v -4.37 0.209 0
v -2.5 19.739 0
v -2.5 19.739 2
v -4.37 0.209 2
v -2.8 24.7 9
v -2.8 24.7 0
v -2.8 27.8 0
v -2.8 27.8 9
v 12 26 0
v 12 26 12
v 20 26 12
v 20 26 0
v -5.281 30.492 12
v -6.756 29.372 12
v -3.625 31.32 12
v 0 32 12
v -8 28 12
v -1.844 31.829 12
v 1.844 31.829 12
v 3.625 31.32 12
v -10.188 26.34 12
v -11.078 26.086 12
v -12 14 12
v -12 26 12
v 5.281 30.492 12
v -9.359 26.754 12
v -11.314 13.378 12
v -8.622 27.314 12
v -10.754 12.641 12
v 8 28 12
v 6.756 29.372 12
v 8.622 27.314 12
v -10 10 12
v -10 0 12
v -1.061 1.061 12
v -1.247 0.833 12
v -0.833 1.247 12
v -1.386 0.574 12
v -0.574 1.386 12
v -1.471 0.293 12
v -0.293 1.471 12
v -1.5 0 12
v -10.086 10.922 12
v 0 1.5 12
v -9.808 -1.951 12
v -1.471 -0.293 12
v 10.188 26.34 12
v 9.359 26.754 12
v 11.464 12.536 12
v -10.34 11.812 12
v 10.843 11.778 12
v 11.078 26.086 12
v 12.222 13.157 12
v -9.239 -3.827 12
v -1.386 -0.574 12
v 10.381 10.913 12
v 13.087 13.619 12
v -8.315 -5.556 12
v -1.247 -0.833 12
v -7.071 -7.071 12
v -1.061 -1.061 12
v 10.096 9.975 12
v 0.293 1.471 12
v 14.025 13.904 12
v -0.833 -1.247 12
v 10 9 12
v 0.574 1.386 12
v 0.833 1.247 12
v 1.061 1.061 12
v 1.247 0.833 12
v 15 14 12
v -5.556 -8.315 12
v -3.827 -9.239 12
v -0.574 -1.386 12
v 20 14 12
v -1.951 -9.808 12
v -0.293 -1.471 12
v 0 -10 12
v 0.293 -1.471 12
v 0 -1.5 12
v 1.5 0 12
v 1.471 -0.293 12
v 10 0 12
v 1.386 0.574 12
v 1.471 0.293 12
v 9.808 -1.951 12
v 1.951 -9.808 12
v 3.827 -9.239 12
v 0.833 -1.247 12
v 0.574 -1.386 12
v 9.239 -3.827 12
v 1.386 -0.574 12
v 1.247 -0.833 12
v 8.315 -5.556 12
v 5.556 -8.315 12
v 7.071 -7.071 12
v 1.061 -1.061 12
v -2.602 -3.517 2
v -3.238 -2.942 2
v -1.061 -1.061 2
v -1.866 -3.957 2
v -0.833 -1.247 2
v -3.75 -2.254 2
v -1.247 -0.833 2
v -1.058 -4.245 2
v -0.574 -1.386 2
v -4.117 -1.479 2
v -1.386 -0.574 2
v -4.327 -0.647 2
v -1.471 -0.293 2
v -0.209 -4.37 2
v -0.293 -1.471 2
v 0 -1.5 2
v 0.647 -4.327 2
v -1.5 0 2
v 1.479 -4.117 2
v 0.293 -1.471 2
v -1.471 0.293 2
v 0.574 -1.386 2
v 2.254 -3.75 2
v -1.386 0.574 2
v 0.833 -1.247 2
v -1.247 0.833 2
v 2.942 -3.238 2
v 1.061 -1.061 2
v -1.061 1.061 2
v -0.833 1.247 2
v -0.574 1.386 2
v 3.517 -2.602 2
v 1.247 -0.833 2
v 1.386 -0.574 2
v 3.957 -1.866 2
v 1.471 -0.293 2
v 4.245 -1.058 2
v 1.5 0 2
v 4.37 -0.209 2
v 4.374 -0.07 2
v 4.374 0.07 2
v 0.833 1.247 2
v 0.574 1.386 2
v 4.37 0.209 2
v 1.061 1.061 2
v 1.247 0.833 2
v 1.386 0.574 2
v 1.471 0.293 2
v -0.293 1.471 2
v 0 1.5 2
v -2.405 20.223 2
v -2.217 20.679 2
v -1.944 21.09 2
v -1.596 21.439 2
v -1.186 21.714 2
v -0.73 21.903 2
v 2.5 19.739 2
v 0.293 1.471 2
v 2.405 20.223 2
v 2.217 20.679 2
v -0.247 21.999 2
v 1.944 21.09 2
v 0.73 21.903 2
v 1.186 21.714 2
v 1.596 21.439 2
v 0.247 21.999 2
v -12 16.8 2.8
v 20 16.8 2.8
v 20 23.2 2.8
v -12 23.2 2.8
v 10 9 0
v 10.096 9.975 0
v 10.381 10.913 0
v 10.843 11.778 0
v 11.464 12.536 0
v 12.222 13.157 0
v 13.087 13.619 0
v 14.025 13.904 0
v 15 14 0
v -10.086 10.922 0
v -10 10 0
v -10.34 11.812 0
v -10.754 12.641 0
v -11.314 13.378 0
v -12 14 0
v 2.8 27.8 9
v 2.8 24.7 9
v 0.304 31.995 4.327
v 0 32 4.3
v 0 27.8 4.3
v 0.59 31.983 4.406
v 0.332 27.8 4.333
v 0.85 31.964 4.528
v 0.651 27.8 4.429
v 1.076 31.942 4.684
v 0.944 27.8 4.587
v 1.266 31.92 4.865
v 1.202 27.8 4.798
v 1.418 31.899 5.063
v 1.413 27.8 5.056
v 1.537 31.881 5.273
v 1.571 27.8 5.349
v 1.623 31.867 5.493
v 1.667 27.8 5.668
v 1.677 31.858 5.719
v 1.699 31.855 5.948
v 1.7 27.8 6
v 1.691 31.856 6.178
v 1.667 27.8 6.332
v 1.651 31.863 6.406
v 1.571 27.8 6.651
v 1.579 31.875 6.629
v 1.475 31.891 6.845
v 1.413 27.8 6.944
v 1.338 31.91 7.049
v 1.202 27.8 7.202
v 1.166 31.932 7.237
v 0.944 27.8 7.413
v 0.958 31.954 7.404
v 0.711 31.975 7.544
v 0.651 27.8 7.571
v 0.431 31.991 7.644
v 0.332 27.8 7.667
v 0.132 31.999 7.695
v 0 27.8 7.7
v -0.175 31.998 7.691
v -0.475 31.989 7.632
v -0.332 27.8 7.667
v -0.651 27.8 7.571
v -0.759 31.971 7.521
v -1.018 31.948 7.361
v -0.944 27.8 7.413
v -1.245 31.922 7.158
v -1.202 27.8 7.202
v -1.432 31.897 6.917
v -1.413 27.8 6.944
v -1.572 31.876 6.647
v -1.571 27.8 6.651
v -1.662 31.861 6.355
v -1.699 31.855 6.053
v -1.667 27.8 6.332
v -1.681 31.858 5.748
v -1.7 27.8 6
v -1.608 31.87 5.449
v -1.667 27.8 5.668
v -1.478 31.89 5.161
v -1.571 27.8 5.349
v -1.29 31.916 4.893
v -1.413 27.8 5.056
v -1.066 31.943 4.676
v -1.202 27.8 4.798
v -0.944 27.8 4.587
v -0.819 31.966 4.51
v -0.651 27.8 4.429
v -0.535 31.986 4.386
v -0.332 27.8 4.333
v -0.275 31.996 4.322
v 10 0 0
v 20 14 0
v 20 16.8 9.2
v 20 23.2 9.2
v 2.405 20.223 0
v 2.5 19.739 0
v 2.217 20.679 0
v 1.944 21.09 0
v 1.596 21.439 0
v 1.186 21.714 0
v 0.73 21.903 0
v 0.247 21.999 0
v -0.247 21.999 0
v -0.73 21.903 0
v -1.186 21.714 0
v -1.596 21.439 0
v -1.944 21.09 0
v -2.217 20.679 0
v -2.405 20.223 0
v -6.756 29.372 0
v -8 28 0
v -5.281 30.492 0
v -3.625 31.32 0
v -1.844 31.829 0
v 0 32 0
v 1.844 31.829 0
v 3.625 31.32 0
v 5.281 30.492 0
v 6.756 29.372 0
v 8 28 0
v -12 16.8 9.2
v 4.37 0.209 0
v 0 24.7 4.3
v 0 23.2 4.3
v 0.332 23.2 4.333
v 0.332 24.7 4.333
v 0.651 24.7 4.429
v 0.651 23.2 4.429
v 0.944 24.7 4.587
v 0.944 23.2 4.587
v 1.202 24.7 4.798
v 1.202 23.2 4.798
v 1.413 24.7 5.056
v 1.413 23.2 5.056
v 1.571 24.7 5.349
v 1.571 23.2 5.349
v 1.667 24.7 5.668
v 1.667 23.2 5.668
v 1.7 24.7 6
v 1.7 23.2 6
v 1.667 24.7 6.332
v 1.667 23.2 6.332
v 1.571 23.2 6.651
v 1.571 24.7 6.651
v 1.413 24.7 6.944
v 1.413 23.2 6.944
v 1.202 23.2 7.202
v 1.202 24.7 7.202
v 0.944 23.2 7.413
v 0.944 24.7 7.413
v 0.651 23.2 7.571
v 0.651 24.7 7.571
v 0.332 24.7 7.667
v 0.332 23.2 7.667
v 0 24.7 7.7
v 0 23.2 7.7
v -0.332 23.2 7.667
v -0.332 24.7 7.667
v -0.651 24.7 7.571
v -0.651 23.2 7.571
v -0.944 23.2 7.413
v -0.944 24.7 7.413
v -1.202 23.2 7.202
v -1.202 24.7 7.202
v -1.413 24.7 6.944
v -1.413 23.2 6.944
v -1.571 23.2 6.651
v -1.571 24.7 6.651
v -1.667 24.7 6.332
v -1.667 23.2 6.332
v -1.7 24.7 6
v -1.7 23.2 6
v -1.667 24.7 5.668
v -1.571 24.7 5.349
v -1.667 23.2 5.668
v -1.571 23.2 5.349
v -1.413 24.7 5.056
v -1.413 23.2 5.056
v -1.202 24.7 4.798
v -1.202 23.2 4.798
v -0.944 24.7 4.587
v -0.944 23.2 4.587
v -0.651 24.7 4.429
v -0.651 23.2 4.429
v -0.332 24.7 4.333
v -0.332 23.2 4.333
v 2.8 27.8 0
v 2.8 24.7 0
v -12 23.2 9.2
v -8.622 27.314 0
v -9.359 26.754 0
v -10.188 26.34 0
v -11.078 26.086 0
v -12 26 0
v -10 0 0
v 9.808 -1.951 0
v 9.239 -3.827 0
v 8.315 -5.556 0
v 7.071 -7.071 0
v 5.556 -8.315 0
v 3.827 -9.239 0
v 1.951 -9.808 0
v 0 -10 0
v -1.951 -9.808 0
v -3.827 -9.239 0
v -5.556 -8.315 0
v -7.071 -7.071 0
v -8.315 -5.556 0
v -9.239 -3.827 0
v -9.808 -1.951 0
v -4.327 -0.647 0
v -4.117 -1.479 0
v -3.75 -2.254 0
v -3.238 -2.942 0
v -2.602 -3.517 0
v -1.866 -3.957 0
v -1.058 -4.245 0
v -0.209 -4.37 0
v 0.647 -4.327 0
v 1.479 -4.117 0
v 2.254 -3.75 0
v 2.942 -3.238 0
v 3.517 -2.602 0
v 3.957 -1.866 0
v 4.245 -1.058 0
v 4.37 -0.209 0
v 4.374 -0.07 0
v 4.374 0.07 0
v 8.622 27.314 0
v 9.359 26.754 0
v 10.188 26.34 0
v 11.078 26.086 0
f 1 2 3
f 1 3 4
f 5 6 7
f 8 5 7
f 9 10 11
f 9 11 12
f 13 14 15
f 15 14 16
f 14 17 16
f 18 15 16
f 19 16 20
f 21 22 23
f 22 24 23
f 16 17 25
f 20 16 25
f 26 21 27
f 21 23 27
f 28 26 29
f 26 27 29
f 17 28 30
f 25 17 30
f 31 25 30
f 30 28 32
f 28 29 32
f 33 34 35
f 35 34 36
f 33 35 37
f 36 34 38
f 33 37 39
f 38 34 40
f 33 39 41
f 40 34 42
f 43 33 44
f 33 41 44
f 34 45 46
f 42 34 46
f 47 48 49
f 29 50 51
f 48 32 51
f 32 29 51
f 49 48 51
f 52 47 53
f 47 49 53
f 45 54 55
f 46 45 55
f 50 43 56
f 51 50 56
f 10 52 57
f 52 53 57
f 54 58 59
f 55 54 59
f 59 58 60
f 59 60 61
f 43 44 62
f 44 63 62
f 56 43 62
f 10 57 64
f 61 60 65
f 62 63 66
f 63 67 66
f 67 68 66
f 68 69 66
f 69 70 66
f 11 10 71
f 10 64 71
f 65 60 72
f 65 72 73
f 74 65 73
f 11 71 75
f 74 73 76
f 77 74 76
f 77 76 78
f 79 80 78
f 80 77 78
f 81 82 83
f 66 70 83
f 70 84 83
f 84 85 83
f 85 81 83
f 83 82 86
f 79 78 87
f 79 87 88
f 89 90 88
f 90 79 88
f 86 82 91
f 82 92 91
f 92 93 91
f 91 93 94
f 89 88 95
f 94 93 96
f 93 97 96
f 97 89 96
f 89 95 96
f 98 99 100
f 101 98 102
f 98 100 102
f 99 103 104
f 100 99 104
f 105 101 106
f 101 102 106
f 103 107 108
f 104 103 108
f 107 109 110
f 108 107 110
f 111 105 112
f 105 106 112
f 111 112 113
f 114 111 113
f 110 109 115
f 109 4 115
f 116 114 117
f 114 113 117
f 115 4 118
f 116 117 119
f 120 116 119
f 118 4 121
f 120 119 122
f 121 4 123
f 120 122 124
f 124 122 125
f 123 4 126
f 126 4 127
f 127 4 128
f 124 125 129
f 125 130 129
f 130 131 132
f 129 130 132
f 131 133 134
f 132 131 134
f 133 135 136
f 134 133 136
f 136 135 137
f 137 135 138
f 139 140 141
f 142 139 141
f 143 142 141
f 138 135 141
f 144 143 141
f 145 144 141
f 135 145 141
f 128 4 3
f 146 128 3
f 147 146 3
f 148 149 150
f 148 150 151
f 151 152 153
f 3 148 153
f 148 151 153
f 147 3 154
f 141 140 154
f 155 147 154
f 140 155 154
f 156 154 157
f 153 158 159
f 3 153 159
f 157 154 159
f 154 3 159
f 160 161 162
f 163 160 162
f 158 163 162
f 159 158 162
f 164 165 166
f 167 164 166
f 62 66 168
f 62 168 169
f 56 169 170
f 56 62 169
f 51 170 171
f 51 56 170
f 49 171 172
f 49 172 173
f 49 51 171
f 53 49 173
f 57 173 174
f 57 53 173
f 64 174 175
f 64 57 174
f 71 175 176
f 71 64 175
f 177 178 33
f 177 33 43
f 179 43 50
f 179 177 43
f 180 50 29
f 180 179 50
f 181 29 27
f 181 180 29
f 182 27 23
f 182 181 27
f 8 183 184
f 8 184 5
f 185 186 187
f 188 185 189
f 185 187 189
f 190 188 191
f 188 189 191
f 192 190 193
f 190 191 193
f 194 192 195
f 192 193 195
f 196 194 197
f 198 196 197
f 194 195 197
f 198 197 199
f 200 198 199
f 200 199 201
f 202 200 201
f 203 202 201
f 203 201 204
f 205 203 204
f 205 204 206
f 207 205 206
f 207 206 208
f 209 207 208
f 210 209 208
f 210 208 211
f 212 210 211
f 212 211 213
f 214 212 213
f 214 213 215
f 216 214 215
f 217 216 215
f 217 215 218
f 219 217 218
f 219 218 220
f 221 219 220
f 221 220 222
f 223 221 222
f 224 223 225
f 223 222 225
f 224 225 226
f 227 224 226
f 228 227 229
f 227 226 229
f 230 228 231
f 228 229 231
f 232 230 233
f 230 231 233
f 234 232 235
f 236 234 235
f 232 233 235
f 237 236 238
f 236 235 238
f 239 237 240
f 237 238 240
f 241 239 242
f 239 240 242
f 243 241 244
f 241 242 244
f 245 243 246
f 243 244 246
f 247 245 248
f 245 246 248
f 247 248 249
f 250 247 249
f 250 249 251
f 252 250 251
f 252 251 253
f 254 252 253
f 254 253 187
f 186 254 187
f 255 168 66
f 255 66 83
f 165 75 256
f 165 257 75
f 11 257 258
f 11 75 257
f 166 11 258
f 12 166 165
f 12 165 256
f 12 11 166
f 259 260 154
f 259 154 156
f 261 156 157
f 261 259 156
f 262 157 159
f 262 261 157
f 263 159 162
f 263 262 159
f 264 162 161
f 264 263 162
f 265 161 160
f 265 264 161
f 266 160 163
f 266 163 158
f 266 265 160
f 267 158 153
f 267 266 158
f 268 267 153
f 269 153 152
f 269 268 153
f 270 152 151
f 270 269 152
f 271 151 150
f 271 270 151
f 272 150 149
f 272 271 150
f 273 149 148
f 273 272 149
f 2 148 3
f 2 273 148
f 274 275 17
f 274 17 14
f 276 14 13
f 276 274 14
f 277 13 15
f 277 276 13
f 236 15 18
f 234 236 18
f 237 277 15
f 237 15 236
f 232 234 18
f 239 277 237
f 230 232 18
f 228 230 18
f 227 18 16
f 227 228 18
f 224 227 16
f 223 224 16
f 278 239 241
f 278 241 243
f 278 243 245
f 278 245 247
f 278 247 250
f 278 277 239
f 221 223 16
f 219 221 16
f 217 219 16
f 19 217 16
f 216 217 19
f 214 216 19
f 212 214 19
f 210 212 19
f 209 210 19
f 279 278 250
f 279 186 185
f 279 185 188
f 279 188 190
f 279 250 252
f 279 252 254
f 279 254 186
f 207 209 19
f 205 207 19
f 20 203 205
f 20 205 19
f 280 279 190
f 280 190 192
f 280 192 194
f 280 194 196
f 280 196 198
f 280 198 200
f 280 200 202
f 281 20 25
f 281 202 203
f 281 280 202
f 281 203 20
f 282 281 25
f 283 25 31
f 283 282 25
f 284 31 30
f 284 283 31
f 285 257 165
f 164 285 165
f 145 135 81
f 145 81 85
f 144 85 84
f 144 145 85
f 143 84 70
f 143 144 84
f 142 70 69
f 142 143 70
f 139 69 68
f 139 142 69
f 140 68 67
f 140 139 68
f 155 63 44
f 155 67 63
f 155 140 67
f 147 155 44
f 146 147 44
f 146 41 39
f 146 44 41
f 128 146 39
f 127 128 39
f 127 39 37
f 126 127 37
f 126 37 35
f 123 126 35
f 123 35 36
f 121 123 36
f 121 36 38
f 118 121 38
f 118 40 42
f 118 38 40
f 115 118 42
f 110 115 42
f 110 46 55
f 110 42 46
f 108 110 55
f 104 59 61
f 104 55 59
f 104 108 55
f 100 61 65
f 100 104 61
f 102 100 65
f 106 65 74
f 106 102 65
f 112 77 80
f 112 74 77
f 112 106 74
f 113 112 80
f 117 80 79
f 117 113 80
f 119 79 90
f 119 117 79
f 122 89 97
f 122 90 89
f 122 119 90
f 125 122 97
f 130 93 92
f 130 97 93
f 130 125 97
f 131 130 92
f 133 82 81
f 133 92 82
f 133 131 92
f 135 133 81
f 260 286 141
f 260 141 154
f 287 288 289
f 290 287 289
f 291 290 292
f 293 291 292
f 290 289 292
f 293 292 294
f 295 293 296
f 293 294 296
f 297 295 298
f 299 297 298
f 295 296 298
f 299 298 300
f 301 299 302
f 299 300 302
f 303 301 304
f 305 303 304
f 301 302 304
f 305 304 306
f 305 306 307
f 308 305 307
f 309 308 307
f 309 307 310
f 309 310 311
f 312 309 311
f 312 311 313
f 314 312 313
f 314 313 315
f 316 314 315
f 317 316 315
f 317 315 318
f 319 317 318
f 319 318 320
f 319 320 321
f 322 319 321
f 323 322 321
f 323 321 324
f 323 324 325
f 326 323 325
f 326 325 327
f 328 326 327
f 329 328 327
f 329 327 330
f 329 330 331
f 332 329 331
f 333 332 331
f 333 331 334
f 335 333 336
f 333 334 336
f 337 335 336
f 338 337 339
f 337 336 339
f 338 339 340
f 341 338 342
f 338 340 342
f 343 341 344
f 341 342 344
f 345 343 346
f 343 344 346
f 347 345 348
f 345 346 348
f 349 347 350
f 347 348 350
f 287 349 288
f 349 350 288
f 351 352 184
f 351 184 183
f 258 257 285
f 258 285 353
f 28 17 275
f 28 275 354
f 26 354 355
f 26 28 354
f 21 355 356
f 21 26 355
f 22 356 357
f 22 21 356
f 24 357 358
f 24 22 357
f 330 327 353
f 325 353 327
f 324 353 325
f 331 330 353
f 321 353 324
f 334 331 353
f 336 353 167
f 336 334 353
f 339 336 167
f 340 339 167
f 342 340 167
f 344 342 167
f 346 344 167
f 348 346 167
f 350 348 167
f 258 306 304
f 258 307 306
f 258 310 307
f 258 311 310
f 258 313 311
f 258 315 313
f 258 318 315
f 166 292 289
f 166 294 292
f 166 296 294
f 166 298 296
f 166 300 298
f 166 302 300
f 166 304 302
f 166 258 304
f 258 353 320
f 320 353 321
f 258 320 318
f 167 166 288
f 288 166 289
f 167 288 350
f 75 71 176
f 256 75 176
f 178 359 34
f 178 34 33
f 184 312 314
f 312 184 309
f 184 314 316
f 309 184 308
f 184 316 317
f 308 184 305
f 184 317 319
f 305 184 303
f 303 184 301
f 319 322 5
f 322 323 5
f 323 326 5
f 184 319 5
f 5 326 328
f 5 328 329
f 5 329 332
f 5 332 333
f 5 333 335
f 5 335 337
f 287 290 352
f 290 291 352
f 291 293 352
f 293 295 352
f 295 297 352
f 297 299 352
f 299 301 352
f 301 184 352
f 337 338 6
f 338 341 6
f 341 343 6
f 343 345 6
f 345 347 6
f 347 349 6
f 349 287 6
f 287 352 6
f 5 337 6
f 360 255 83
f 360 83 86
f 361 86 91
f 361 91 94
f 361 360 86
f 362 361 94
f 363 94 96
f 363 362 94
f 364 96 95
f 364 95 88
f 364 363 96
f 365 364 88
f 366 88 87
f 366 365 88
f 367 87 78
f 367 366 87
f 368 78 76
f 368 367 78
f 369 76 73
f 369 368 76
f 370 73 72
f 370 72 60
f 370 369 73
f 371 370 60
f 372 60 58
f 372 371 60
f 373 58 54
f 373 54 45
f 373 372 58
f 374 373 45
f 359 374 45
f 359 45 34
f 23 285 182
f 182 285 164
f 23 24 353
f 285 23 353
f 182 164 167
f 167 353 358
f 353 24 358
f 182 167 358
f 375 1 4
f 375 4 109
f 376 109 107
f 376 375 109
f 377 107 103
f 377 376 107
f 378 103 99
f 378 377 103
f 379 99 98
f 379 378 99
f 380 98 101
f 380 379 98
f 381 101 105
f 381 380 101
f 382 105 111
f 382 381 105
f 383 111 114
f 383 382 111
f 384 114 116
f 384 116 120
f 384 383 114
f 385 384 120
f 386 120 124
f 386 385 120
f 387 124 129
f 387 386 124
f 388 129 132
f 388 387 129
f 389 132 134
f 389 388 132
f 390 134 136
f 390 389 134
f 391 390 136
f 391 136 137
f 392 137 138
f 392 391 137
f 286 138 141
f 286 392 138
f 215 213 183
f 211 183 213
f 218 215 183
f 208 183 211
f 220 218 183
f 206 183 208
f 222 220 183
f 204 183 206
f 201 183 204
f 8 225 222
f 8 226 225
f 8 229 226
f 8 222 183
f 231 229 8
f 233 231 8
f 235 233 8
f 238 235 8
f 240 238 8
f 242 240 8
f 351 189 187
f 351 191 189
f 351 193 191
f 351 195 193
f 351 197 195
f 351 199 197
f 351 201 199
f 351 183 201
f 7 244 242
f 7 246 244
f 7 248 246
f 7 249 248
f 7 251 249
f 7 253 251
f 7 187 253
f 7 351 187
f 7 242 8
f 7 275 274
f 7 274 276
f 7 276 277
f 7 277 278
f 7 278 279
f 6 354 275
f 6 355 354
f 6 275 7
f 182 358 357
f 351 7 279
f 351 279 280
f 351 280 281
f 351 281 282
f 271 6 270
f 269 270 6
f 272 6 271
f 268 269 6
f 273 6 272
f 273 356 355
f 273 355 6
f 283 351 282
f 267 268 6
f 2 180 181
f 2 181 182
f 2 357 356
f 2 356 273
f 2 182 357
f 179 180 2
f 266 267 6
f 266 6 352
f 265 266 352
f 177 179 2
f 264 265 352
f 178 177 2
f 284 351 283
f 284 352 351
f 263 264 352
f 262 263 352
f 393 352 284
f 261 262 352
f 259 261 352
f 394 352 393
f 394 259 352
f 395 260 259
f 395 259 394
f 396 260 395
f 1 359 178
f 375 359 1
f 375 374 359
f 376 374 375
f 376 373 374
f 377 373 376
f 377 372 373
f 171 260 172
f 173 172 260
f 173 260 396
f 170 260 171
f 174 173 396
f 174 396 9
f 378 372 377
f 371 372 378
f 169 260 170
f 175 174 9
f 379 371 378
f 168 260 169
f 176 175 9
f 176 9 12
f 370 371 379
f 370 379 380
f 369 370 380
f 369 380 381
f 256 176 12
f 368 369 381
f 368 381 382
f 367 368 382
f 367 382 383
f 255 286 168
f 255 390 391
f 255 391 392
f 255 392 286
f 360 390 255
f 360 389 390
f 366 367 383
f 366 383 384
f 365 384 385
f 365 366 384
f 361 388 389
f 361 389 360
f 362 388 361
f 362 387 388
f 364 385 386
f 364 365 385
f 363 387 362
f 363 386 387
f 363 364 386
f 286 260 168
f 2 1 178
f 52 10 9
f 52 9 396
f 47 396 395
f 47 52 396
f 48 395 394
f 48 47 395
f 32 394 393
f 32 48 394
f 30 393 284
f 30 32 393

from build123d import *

# Parameters (mm, degrees)
BOSS_EXTRUDE1_DEPTH      = 12
SKETCH4_R                = 1.5
CUT_EXTRUDE2_DEPTH       = 36.60898763
BOSS_EXTRUDE2_DEPTH      = 20
BOSS_EXTRUDE2_DEPTH_BACK = 12
SKETCH7_W                = 12
SKETCH7_H                = 12
CUT_EXTRUDE1_DEPTH       = 2
SKETCH8_W                = 6.4
SKETCH8_H                = 6.4
CUT_EXTRUDE4_DEPTH       = 47.818799643
SKETCH9_W                = 5.6
SKETCH9_H                = 3.1
CUT_EXTRUDE5_DEPTH       = 9
SKETCH10_R               = 1.7
CUT_EXTRUDE6_DEPTH       = 41.573883226
FILLET1_R                = 5


with BuildPart() as part:
    # Sketch1 → Boss-Extrude1 (new body)
    with BuildSketch(Plane.XY):
        with BuildLine():
            Line((10, 22), (10, 0))
            ThreePointArc((10, 0), (0, -10), (-10, 0))
            Line((-10, 0), (-10, 22))
            ThreePointArc((-10, 22), (0, 32), (10, 22))
        make_face()
    extrude(amount=BOSS_EXTRUDE1_DEPTH)

    # Sketch4 → Cut-Extrude2 (cut, through all)
    with BuildSketch(Plane.XY):
        Circle(SKETCH4_R)
    extrude(amount=CUT_EXTRUDE2_DEPTH, mode=Mode.SUBTRACT)

    # Sketch7 → Boss-Extrude2 (add, two sides: drawn at the far end of the back side and taken through both)
    with BuildSketch(Plane(origin=(0, 0, 0), x_dir=(0, 0, -1), z_dir=(1, 0, 0)).offset(-BOSS_EXTRUDE2_DEPTH_BACK)):
        with Locations((-6, 20)):
            Rectangle(SKETCH7_W, SKETCH7_H)
    extrude(amount=BOSS_EXTRUDE2_DEPTH + BOSS_EXTRUDE2_DEPTH_BACK)

    # Sketch2 → Cut-Extrude1 (cut)
    with BuildSketch(Plane.XY):
        with BuildLine():
            Line((-2.5, 19.73937205), (-4.37, 0.209105237))
            ThreePointArc((-4.37, 0.209105237), (-0.209105237, -4.37), (4.37, -0.209105237))
            ThreePointArc((4.37, -0.209105237), (4.375, 0), (4.37, 0.209105237))
            Line((4.37, 0.209105237), (2.5, 19.73937205))
            ThreePointArc((2.5, 19.73937205), (0, 22.01143365), (-2.5, 19.73937205))
        make_face()
    extrude(amount=CUT_EXTRUDE1_DEPTH, mode=Mode.SUBTRACT)

    # Sketch8 → Cut-Extrude4 (cut, through all)
    with BuildSketch(Plane(origin=(20, 0, 0), x_dir=(0, 0, -1), z_dir=(1, 0, 0))):
        with Locations((-6, 20)):
            Rectangle(SKETCH8_W, SKETCH8_H)
    extrude(amount=-CUT_EXTRUDE4_DEPTH, mode=Mode.SUBTRACT)

    # Sketch9 → Cut-Extrude5 (cut)
    with BuildSketch(Plane(origin=(0, 0, 0), x_dir=(-1, 0, 0), z_dir=(0, 0, -1))):
        with Locations((0, 26.25)):
            Rectangle(SKETCH9_W, SKETCH9_H)
    extrude(amount=-CUT_EXTRUDE5_DEPTH, mode=Mode.SUBTRACT)

    # Sketch10 → Cut-Extrude6 (cut, through all)
    with BuildSketch(Plane.XZ.offset(-23.2)):
        with Locations(Location((0, 6, 0), (0, 0, 270))):
            Circle(SKETCH10_R)
    extrude(amount=-CUT_EXTRUDE6_DEPTH, mode=Mode.SUBTRACT)

    # Fillet1
    # the kernel refuses this fillet: 5 mm, written as the material it adds along each edge
    with BuildSketch(Plane(origin=(10, 14, 12), x_dir=(1, 0, 0), z_dir=(0, 0, -1))) as fillet1_piece_1:
        with BuildLine():
            CenterArc((FILLET1_R, FILLET1_R), FILLET1_R, 180, 90)
            Line((0, FILLET1_R), (-FILLET1_R * 0.02, FILLET1_R))
            Line((-FILLET1_R * 0.02, FILLET1_R), (-FILLET1_R * 0.02, -FILLET1_R * 0.02))
            Line((-FILLET1_R * 0.02, -FILLET1_R * 0.02), (FILLET1_R, -FILLET1_R * 0.02))
            Line((FILLET1_R, -FILLET1_R * 0.02), (FILLET1_R, 0))
        make_face()
    extrude(amount=12)
    with BuildSketch(Plane(origin=(-9.16515139, 26, 12), x_dir=(0.5033825030764704, 0.8640636872340298, 0), z_dir=(0, 0, -1))) as fillet1_piece_2:
        with BuildLine():
            CenterArc((2.893305247, -4.966402258), FILLET1_R, 96.645859584, 53.130102354)
            Line((-1.427013189, -2.449489743), (-1.513419558, -2.399151492))
            Line((-1.513419558, -2.399151492), (-0.086406369, 0.05033825))
            Line((-0.086406369, 0.05033825), (0.011573221, 0.099328045))
            ThreePointArc((0.011573221, 0.099328045), (1.157322099, 0.032804516), (2.303070977, 0.099328045))
            Line((2.303070977, 0.099328045), (2.314644198, 0))
        make_face()
    extrude(amount=12)
    with BuildSketch(Plane(origin=(9.16515139, 26, 12), x_dir=(1, 0, 0), z_dir=(0, 0, -1))) as fillet1_piece_3:
        with BuildLine():
            CenterArc((2.83484861, -5), FILLET1_R, 90, 53.130102354)
            Line((-1.16515139, -2), (-1.24515139, -1.94))
            ThreePointArc((-1.24515139, -1.94), (-0.610920886, -0.98348678), (-0.091651514, 0.04))
            Line((-0.091651514, 0.04), (0, 0.1))
            Line((0, 0.1), (2.83484861, 0.1))
            Line((2.83484861, 0.1), (2.83484861, 0))
        make_face()
    extrude(amount=12)
    with BuildSketch(Plane(origin=(-10, 14, 0), x_dir=(-1, 0, 0), z_dir=(0, 0, 1))) as fillet1_piece_4:
        with BuildLine():
            CenterArc((5, 4), FILLET1_R, 180, 53.130102354)
            Line((0, 4), (-0.1, 4))
            Line((-0.1, 4), (-0.1, 0))
            Line((-0.1, 0), (0, -0.1))
            ThreePointArc((0, -0.1), (1, -0.1), (1.94, -0.08))
            Line((1.94, -0.08), (2, 0))
        make_face()
    extrude(amount=12)


solid = part.part
